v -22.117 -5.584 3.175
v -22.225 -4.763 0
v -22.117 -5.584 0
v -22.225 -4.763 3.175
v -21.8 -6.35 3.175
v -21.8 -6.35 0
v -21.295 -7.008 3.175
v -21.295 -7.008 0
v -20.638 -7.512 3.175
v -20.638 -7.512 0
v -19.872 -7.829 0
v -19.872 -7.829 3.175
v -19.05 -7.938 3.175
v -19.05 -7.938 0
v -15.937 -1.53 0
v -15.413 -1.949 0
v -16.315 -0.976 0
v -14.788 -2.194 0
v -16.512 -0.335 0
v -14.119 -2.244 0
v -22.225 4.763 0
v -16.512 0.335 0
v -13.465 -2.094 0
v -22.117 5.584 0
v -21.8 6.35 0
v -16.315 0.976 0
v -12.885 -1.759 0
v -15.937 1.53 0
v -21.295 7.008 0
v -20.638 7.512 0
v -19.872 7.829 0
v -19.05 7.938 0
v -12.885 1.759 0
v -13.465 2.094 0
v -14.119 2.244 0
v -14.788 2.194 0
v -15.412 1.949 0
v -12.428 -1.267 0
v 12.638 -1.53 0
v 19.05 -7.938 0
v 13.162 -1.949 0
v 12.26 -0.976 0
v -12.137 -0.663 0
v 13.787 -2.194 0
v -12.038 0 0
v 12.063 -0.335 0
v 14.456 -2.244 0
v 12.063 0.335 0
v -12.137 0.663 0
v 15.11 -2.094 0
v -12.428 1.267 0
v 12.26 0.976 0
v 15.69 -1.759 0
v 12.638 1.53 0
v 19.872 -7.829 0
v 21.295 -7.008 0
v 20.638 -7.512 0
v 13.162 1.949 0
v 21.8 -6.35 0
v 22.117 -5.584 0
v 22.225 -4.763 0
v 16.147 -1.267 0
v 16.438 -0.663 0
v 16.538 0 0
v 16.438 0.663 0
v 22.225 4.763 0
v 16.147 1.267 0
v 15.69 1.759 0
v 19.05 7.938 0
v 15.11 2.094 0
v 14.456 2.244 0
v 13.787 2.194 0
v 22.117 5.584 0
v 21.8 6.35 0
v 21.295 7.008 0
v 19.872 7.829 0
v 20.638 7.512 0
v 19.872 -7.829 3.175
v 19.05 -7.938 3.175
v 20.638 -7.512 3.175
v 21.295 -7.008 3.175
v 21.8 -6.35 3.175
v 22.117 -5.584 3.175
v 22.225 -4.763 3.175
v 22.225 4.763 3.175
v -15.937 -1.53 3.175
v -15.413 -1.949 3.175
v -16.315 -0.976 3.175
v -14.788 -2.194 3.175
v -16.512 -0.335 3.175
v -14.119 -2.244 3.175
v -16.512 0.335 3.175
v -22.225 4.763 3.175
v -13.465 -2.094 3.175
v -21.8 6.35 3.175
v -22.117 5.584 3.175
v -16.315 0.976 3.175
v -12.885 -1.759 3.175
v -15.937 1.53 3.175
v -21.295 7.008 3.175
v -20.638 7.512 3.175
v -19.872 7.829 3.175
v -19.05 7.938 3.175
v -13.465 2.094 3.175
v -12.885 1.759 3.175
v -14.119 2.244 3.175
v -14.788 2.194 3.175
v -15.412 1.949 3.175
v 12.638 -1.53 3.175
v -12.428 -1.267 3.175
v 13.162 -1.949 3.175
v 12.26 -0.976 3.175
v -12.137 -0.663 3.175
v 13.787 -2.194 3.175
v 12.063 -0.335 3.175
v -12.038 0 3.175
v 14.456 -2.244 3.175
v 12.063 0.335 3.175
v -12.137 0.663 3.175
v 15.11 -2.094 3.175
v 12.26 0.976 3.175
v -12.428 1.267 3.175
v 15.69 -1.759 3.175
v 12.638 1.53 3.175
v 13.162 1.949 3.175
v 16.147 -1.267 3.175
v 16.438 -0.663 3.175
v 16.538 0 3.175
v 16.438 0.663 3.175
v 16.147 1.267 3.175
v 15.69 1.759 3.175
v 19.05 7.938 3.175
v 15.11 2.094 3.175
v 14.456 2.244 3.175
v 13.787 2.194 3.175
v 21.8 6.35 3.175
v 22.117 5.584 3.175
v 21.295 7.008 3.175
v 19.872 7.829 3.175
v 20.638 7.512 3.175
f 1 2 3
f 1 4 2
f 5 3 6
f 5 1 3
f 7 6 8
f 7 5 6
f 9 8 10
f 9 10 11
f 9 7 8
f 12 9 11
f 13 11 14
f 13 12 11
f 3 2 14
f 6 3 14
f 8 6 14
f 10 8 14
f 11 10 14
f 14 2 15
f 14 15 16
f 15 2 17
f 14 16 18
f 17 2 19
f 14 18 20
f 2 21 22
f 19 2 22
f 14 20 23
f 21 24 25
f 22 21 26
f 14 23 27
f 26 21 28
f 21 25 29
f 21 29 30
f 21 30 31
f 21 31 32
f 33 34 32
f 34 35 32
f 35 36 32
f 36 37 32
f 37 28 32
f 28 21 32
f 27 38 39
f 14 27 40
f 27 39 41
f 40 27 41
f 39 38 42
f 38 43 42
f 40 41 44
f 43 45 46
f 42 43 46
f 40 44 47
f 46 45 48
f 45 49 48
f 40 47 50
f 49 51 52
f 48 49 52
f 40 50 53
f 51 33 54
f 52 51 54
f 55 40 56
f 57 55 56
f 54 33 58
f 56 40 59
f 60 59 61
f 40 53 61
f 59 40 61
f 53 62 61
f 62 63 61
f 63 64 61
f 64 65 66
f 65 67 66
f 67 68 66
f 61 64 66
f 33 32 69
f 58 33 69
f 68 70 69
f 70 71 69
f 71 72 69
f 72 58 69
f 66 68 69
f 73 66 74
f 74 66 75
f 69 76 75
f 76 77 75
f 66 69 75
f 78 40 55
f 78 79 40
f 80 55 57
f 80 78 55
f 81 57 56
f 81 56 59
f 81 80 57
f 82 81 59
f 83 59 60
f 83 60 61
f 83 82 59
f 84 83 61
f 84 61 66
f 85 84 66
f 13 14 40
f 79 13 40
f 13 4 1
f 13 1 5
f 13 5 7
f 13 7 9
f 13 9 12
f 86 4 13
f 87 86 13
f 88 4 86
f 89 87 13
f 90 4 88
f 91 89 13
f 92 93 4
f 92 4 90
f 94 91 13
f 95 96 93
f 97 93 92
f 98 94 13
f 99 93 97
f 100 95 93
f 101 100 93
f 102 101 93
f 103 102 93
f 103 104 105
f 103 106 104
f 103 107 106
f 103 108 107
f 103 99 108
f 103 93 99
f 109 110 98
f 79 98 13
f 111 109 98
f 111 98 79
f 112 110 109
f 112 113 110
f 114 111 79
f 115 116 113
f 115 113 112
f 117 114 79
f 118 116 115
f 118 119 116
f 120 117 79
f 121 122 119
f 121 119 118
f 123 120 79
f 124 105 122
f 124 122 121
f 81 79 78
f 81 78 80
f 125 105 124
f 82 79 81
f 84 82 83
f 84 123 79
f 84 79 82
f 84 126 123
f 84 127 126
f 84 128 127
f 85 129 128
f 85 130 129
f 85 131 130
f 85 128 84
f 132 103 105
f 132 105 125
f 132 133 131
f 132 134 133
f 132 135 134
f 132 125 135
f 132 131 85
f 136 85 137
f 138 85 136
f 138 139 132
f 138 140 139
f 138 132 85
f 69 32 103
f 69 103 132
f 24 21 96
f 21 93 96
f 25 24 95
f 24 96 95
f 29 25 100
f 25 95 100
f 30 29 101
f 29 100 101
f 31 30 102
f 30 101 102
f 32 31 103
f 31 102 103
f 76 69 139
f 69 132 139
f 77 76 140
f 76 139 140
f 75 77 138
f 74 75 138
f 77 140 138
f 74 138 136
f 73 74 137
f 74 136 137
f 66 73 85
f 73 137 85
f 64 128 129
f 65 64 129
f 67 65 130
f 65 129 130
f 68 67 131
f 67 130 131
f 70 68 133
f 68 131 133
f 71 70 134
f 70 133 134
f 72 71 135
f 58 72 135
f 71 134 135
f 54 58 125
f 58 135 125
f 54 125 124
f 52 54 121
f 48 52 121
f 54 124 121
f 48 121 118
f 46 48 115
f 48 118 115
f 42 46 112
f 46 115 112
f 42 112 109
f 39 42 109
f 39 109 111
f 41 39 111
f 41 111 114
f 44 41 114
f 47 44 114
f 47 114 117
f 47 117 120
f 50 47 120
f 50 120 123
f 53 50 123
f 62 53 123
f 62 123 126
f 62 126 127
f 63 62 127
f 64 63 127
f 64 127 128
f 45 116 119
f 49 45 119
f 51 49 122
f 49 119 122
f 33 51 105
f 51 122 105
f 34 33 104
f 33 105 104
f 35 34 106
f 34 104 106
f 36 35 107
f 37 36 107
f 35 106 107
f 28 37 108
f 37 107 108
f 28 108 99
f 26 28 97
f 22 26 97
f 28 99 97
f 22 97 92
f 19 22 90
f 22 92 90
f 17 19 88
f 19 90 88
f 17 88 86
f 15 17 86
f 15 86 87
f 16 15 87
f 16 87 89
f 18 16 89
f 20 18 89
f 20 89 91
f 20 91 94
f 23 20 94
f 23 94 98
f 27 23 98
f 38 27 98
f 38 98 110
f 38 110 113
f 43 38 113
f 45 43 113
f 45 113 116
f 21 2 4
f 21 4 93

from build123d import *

# Parameters (mm, degrees)
SKETCH1_W            = 44.45
SKETCH1_H            = 15.875
BOSS_EXTRUDE1_DEPTH  = 3.175
M4_CLEARANCE_HOLE1_D = 4.5
FILLET1_R            = 3.175


with BuildPart() as part:
    # Sketch1 → Boss-Extrude1 (new body)
    with BuildSketch(Plane.XY):
        Rectangle(SKETCH1_W, SKETCH1_H)
    extrude(amount=BOSS_EXTRUDE1_DEPTH)

    # M4 Clearance Hole1 (through all)
    with Locations(Plane(origin=(0, 0, 0), x_dir=(-1, 0, 0), z_dir=(0, 0, -1))):
        with Locations((-14.2875, 0), (14.2875, 0)):
            Hole(M4_CLEARANCE_HOLE1_D / 2)

    # Fillet1
    fillet1_edges = [part.edges().sort_by_distance(p)[0] for p in [
        (22.225, -7.9375, 1.5875),
        (-22.225, -7.9375, 1.5875),
        (-22.225, 7.9375, 1.5875),
        (22.225, 7.9375, 1.5875),
    ]]
    fillet(fillet1_edges, radius=FILLET1_R)


solid = part.part
